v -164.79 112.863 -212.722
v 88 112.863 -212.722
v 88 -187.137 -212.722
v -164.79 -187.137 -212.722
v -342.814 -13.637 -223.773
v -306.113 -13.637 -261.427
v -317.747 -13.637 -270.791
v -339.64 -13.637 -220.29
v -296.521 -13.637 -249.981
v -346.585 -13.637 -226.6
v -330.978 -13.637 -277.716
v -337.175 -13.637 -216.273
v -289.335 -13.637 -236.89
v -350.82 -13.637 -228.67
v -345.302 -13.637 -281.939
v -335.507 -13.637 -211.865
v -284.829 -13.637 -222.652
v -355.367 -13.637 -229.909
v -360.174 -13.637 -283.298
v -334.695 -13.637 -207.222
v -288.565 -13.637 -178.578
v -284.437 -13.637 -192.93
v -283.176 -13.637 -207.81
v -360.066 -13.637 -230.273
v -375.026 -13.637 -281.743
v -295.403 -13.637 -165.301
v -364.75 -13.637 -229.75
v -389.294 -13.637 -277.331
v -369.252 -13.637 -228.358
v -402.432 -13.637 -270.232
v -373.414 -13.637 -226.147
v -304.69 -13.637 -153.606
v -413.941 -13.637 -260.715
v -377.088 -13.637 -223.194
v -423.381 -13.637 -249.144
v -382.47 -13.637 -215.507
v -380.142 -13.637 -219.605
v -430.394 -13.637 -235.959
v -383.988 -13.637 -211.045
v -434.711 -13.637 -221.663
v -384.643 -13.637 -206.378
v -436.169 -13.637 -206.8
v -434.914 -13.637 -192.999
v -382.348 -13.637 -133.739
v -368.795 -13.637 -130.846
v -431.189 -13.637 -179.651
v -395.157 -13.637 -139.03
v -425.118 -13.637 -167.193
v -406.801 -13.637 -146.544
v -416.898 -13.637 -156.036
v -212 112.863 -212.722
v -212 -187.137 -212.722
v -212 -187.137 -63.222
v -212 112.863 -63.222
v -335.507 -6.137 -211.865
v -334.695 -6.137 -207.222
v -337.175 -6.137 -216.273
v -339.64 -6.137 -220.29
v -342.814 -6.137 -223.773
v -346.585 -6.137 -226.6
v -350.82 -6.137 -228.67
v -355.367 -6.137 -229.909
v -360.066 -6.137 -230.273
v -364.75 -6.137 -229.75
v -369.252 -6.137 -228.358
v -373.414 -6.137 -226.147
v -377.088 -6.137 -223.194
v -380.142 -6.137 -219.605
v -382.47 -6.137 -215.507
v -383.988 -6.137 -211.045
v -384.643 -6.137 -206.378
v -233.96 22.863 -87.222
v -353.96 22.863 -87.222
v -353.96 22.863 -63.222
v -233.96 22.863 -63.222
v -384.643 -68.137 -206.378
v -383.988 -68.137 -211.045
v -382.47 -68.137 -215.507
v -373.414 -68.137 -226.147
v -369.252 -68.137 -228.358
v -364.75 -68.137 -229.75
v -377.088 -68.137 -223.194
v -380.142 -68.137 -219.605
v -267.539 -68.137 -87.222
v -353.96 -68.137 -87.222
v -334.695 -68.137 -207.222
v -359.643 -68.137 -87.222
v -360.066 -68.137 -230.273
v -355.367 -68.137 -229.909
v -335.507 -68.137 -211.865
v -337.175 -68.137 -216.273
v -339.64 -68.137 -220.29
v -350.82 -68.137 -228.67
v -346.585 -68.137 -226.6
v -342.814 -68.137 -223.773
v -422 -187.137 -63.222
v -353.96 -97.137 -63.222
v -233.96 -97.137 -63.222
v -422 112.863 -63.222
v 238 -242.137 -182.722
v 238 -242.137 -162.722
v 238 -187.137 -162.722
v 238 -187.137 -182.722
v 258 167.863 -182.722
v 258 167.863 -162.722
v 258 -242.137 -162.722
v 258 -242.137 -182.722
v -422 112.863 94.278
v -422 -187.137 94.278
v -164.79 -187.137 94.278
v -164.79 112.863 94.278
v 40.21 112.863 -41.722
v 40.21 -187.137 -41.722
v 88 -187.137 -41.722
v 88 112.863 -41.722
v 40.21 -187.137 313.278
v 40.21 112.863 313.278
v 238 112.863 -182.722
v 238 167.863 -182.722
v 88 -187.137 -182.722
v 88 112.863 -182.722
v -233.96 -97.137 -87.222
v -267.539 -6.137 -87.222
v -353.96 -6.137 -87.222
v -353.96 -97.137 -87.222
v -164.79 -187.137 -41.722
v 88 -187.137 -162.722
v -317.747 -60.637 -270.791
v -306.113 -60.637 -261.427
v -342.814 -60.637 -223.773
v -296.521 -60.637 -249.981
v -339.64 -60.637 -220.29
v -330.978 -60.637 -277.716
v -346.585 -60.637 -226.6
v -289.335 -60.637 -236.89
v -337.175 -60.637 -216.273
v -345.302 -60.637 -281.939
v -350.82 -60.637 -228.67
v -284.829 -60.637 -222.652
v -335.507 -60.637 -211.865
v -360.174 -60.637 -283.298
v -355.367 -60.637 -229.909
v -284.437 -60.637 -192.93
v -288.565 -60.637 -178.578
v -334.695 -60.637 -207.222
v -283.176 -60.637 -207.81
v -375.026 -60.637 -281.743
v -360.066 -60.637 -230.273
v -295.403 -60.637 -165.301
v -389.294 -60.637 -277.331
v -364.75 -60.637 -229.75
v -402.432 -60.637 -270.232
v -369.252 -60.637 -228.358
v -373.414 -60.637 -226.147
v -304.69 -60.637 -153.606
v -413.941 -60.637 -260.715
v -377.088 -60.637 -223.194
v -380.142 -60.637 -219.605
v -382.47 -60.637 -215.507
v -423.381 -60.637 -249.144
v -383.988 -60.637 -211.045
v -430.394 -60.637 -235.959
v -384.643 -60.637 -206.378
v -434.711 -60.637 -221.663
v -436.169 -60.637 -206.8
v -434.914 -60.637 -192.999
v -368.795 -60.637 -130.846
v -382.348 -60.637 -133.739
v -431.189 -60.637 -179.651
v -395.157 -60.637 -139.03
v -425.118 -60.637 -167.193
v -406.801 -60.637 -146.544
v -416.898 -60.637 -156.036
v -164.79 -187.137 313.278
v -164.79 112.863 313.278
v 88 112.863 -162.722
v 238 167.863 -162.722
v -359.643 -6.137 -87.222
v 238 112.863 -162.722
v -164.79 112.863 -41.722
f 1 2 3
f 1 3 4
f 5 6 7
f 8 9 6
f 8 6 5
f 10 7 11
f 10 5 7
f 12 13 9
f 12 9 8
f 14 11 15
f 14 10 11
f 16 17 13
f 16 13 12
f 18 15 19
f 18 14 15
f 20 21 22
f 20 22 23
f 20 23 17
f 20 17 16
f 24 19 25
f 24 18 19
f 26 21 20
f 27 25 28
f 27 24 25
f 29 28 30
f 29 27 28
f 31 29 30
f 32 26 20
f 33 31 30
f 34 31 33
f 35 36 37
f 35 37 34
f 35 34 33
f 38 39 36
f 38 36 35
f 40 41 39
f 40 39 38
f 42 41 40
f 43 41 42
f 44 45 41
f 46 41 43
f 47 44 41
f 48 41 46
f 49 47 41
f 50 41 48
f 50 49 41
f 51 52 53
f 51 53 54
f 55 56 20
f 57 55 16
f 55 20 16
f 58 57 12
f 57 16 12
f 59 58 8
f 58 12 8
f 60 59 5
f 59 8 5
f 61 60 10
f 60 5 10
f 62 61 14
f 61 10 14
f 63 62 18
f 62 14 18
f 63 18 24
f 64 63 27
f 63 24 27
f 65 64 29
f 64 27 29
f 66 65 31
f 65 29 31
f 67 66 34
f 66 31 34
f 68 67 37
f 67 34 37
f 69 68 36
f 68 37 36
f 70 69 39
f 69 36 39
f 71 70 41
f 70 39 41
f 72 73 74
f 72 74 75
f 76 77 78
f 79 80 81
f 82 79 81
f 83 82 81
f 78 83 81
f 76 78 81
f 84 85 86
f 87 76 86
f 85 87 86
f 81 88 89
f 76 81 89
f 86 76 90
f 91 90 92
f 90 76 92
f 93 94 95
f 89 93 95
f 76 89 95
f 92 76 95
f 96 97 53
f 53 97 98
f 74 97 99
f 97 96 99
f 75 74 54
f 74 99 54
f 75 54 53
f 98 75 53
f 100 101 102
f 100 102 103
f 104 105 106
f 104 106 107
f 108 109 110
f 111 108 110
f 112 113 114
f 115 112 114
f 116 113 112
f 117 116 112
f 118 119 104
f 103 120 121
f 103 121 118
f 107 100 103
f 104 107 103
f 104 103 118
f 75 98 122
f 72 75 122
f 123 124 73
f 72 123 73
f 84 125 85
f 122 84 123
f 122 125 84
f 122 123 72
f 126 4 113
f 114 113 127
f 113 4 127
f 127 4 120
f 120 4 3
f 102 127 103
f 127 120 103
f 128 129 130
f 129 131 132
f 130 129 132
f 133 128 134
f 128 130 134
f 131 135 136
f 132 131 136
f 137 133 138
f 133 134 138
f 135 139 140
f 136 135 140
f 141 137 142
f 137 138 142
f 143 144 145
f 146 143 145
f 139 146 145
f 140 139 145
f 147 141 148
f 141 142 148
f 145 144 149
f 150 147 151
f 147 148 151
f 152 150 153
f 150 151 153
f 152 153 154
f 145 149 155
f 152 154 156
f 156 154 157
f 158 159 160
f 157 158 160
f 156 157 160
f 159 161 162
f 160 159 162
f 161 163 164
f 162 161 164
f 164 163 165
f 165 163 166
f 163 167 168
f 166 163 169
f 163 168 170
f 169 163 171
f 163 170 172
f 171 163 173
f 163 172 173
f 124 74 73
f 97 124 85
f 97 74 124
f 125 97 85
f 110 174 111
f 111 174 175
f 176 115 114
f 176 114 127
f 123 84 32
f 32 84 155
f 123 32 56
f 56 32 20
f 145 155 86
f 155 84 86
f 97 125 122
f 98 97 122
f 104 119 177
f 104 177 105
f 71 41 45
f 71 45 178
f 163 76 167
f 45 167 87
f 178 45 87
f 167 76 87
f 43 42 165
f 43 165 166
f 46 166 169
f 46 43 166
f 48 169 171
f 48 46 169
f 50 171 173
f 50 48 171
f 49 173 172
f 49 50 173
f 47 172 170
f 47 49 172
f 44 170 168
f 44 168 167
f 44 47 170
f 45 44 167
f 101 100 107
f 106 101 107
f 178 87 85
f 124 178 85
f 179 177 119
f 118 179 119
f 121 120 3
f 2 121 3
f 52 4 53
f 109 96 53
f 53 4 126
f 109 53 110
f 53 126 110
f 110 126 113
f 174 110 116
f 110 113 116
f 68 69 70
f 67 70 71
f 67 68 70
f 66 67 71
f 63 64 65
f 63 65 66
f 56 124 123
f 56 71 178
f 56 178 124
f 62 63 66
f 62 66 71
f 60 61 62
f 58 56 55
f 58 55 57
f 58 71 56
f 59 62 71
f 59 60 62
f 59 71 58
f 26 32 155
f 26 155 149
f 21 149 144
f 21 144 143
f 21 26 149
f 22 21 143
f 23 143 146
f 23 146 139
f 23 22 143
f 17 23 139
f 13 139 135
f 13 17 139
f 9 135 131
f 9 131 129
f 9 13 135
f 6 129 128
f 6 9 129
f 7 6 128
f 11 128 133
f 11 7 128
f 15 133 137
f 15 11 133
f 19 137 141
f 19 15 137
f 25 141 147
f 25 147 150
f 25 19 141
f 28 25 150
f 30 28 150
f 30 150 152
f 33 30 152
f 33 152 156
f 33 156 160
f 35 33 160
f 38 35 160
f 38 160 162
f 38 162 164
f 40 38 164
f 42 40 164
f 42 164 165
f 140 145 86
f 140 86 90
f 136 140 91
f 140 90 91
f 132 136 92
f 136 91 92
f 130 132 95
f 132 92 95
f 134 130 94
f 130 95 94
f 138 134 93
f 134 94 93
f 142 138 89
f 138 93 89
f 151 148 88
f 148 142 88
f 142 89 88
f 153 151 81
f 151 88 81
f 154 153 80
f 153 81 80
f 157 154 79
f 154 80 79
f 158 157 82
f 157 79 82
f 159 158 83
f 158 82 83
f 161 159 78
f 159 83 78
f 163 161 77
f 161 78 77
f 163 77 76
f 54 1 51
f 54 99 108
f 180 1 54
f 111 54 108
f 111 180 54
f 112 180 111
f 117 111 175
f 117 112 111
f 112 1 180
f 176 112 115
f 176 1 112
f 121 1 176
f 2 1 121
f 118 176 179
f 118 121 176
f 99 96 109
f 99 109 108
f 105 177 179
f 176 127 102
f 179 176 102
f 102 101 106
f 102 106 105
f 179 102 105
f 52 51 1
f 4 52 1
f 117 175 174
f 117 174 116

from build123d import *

# Parameters (mm, degrees)
SKETCH_1_W                     = 300
SKETCH_1_H                     = 171
EXTRUDE_1_DEPTH                = 300
SKETCH_2_W                     = 205.00000064
SKETCH_2_H                     = 300
EXTRUDE_2_DEPTH                = 355
SKETCH_3_W                     = 300
SKETCH_3_H                     = 136
EXTRUDE_3_DEPTH                = 257.21007636
EXTRUDE_4_DEPTH                = 24
EXTRUDE_5_DEPTH                = 120
EXTRUDE_7_DEPTH                = 62
CUT_EXTRUDE_3_DEPTH            = 133
EXTRUDE_9_DEPTH                = 62
CUT_EXTRUDE_4_DEPTH            = 7.5
CUT_EXTRUDE_START              = -7.5
CUT_EXTRUDE_5_DEPTH            = 7.5
SKETCH_13_W                    = 300
SKETCH_13_H                    = 20
EXTRUDE_10_DEPTH               = 170
SKETCH_14_W                    = 20
SKETCH_14_H                    = 20
EXTRUDE_11_DEPTH               = 55
SKETCH_15_W                    = 20
SKETCH_15_H                    = 20
EXTRUDE_13_DEPTH               = 55
MOVE_BODY_2_ANGLE              = 90
SPLIT_START                    = -187.136600778
SPLIT_BODIES_1_DEPTH           = 300
SPLIT_START_2                  = -242.136600778
SPLIT_BODIES_1_2_OUTLINE_W     = 20
SPLIT_BODIES_1_2_OUTLINE_H     = 20
SPLIT_BODIES_1_2_DEPTH         = 410
SPLIT_START_3                  = -212.722279175
SPLIT_BODIES_1_3_DEPTH         = 171
SPLIT_START_4                  = -68.136600778
SPLIT_BODIES_1_4_DEPTH         = 62
SPLIT_START_5                  = -97.136600778
SPLIT_BODIES_1_5_OUTLINE_W     = 120
SPLIT_BODIES_1_5_OUTLINE_H     = 24
SPLIT_BODIES_1_5_DEPTH         = 120
SKETCH_16_W                    = 210
SKETCH_16_H                    = 300
EXTRUDE_14_DEPTH               = 21.5
SPLIT_START_6                  = -63.222279175
SPLIT_BODIES_4_OUTLINE_W       = 257.21007636
SPLIT_BODIES_4_OUTLINE_H       = 300
SPLIT_BODIES_4_DEPTH           = 157.5
SPLIT_BODIES_4_2_OUTLINE_W     = 47.21007636
SPLIT_BODIES_4_2_OUTLINE_H     = 300
SPLIT_BODIES_4_2_DEPTH         = 149.5
SPLIT_BODIES_4_3_OUTLINE_W     = 257.21007636
SPLIT_BODIES_4_3_OUTLINE_H     = 300
SPLIT_BODIES_4_3_DEPTH         = 157.5
SPLIT_BODIES_4_4_OUTLINE_W     = 47.21007636
SPLIT_BODIES_4_4_OUTLINE_H     = 300
SPLIT_BODIES_4_4_DEPTH         = 149.5
SPLIT_BODIES_7_SURFACE_1_BACK  = 1003.933
SPLIT_BODIES_7_SURFACE_1_DEPTH = 2007.866
SPLIT_BODIES_7_SURFACE_2_BACK  = 1003.933
SPLIT_BODIES_7_SURFACE_2_DEPTH = 2007.866


# Read off the part's stored shape, not the designer's step: 部品分割1, 部品分割3, 部品分割4
with BuildPart() as part:
    # ｽｹｯﾁ1 → ﾎﾞｽ - 押し出し1 (new body)
    with BuildSketch(Plane(origin=(0, 0, 0), x_dir=(0, 0, -1), z_dir=(1, 0, 0))):
        with Locations((105.647745135, 53.288865182)):
            Rectangle(SKETCH_1_W, SKETCH_1_H)
    extrude(amount=EXTRUDE_1_DEPTH)

    # ｽｹｯﾁ2 → ﾎﾞｽ - 押し出し2 (add)
    with BuildSketch(Plane(origin=(0, 138.788865182, 0), x_dir=(1, 0, 0), z_dir=(0, 1, 0))):
        with Locations((149.71007668, 105.647745135)):
            Rectangle(SKETCH_2_W, SKETCH_2_H)
    extrude(amount=EXTRUDE_2_DEPTH)

    # ｽｹｯﾁ3 → ﾎﾞｽ - 押し出し3 (add)
    with BuildSketch(Plane.ZY.offset(-47.21007636)):
        with Locations((-105.647745135, 206.788865182)):
            Rectangle(SKETCH_3_W, SKETCH_3_H)
    extrude(amount=EXTRUDE_3_DEPTH)

    # ｽｹｯﾁ4 → ﾎﾞｽ - 押し出し4 (add)
    with BuildSketch(Plane.XZ.offset(-138.788865182)):
        Polygon((-141.96039145, -105.647745135), (-141.96039145, -45.647745135), (-21.96039145, -45.647745135), (-21.96039145, -165.647745135), (-141.96039145, -165.647745135), align=None)
    extrude(amount=EXTRUDE_4_DEPTH)

    # ｽｹｯﾁ5 → ﾎﾞｽ - 押し出し5 (add)
    with BuildSketch(Plane.XZ.offset(-114.788865182)):
        Polygon((-141.96039145, -105.647745135), (-141.96039145, -136.647745135), (-21.96039145, -136.647745135), (-21.96039145, -74.647745135), (-141.96039145, -74.647745135), align=None)
    extrude(amount=EXTRUDE_5_DEPTH)

    # ｽｹｯﾁ6 → ﾎﾞｽ - 押し出し7 (add)
    with BuildSketch(Plane(origin=(0, 0, -136.647745135), x_dir=(-1, 0, 0), z_dir=(0, 0, -1))):
        Polygon((141.96039145, 114.788865182), (81.96039145, 114.788865182), (122.64268945, -4.366639057), (147.64268945, -4.366639057), (147.64268945, 114.788865182), align=None)
        with BuildLine():
            Line((147.64268945, -4.366639057), (122.64268945, -4.366639057))
            ThreePointArc((122.64268945, -4.366639057), (147.64268945, -28.265469922), (172.64268945, -4.366639057))
            Line((172.64268945, -4.366639057), (147.64268945, -4.366639057))
        make_face()
        Polygon((172.64268945, -4.366639057), (147.64268945, 114.788865182), (147.64268945, -4.366639057), align=None)
    extrude(amount=-EXTRUDE_7_DEPTH)

    # ｽｹｯﾁ8 → ｶｯﾄ - 押し出し3 (cut)
    with BuildSketch(Plane(origin=(0, 0, -136.647745135), x_dir=(-1, 0, 0), z_dir=(0, 0, -1))):
        Polygon((122.695062033, -5.211134818), (55.539135991, 114.788865182), (21.96039145, 114.788865182), (21.96039145, -5.211134818), align=None)
    extrude(amount=-CUT_EXTRUDE_3_DEPTH, mode=Mode.SUBTRACT)

    # ｽｹｯﾁ13 → ﾎﾞｽ - 押し出し10 (add)
    with BuildSketch(Plane(origin=(300, 0, 0), x_dir=(0, 0, -1), z_dir=(1, 0, 0))):
        with Locations((105.647745135, 7.788865182)):
            Rectangle(SKETCH_13_W, SKETCH_13_H)
    extrude(amount=EXTRUDE_10_DEPTH)

    # ｽｹｯﾁ14 → ﾎﾞｽ - 押し出し11 (add)
    with BuildSketch(Plane.XY.offset(44.352254865)):
        with Locations((460, 7.788865182)):
            Rectangle(SKETCH_14_W, SKETCH_14_H)
    extrude(amount=EXTRUDE_11_DEPTH)

    # ｽｹｯﾁ15 → ﾎﾞｽ - 押し出し13 (add)
    with BuildSketch(Plane(origin=(0, 0, -255.647745135), x_dir=(-1, 0, 0), z_dir=(0, 0, -1))):
        with Locations((-460, 7.788865182)):
            Rectangle(SKETCH_15_W, SKETCH_15_H)
    extrude(amount=EXTRUDE_13_DEPTH)


with BuildPart() as body_2:
    # ｽｹｯﾁ9 → ﾎﾞｽ - 押し出し9 (new body)
    with BuildSketch(Plane(origin=(0, 0, -136.647745135), x_dir=(-1, 0, 0), z_dir=(0, 0, -1))):
        with BuildLine():
            ThreePointArc((172.64268945, -4.366639057), (148.065748541, -28.261893715), (122.695062033, -5.211134818))
            Line((122.695062033, -5.211134818), (92.689876472, 48.40471831))
            ThreePointArc((92.689876472, 48.40471831), (118.977792145, -75.704835229), (224.168875741, -4.788886938))
            ThreePointArc((224.168875741, -4.788886938), (204.898385478, 45.975600801), (156.795458346, 71.164753462))
            Line((156.795458346, 71.164753462), (172.64268945, -4.366639057))
        make_face()
    extrude(amount=-EXTRUDE_9_DEPTH)

    # ｽｹｯﾁ11 → ｶｯﾄ - 押し出し4 (cut)
    with BuildSketch(Plane(origin=(0, 0, -136.647745135), x_dir=(-1, 0, 0), z_dir=(0, 0, -1))):
        with BuildLine():
            Line((156.795458346, 71.164753462), (172.64268945, -4.366639057))
            ThreePointArc((172.64268945, -4.366639057), (148.065748541, -28.261893715), (122.695062033, -5.211134818))
            Line((122.695062033, -5.211134818), (92.689876472, 48.40471831))
            ThreePointArc((92.689876472, 48.40471831), (173.264106323, -76.880038763), (156.795458346, 71.164753462))
        make_face()
    extrude(amount=-CUT_EXTRUDE_4_DEPTH, mode=Mode.SUBTRACT)

    # ｽｹｯﾁ12 → ｶｯﾄ - 押し出し5 (cut)
    with BuildSketch(Plane.XY.offset(-74.647745135).offset(CUT_EXTRUDE_START)):
        with BuildLine():
            Line((-156.795458346, 71.164753462), (-172.64268945, -4.366639057))
            ThreePointArc((-172.64268945, -4.366639057), (-148.065748541, -28.261893715), (-122.695062033, -5.211134818))
            Line((-122.695062033, -5.211134818), (-92.689876472, 48.40471831))
            ThreePointArc((-92.689876472, 48.40471831), (-173.264106323, -76.880038763), (-156.795458346, 71.164753462))
        make_face()
    extrude(amount=CUT_EXTRUDE_5_DEPTH, mode=Mode.SUBTRACT)


with BuildPart() as part_1:
    # Move Body 2: moved
    add(part.part.rotate(Axis((0, 112.863399222, -105.647745135), (1, 0, 0)), MOVE_BODY_2_ANGLE))


with BuildPart() as body_2_1:
    # Move Body 2: moved
    add(body_2.part.rotate(Axis((0, 112.863399222, -105.647745135), (1, 0, 0)), MOVE_BODY_2_ANGLE))


with BuildPart() as part_2:
    # Move Body 3: moved
    add(part_1.part.moved(Location((-212, -150, 38))))

    # Split Bodies 1 3 outline → Split Bodies 1 3 (cut)
    with BuildSketch(Plane.XY.offset(SPLIT_START_3)):
        Polygon((-212, 112.863399222), (-212, -187.136600778), (238, -187.136600778), (238, -242.136600778), (258, -242.136600778), (258, 167.863399222), (238, 167.863399222), (238, 112.863399222), align=None)
        Polygon((-386, -6.136600778), (-386, -68.136600778), (-353.96039145, -68.136600778), (-353.96039145, -97.136600778), (-233.96039145, -97.136600778), (-233.96039145, 22.863399222), (-353.96039145, 22.863399222), (-353.96039145, -6.136600778), align=None)
    extrude(amount=SPLIT_BODIES_1_3_DEPTH, mode=Mode.SUBTRACT)


with BuildPart() as body_2_2:
    # Move Body 3: moved
    add(body_2_1.part.moved(Location((-212, -150, 38))))


with BuildPart() as body_3:
    # Split Bodies 1 outline → Split Bodies 1 (new body)
    with BuildSketch(Plane(origin=(0, 0, 0), x_dir=(1, 0, 0), z_dir=(0, 1.0, 1.1906985813992e-12)).offset(SPLIT_START)):
        Polygon((-212, 41.722279175), (88, 41.722279175), (88, 162.722279175), (258, 162.722279175), (258, 182.722279175), (88, 182.722279175), (88, 212.722279175), (-212, 212.722279175), align=None)
    extrude(amount=SPLIT_BODIES_1_DEPTH)

    # Split Bodies 1 2 outline → Split Bodies 1 2 (add)
    with BuildSketch(Plane(origin=(0, 0, 0), x_dir=(1, 0, 0), z_dir=(0, 1.0, 1.1906985813992e-12)).offset(SPLIT_START_2)):
        with Locations((248, 172.722279175)):
            Rectangle(SPLIT_BODIES_1_2_OUTLINE_W, SPLIT_BODIES_1_2_OUTLINE_H)
    extrude(amount=SPLIT_BODIES_1_2_DEPTH)


with BuildPart() as body_4:
    # Split Bodies 1 4 outline → Split Bodies 1 4 (new body)
    with BuildSketch(Plane(origin=(0, 0, 0), x_dir=(1, 0, 0), z_dir=(0, 1.0, 1.1906985813992e-12)).offset(SPLIT_START_4)):
        with BuildLine():
            Line((-233.96039145, 41.722279175), (-233.96039145, 65.722279175))
            Line((-233.96039145, 65.722279175), (-267.539135991, 65.722279175))
            Line((-267.539135991, 65.722279175), (-334.695062033, 185.722279175))
            ThreePointArc((-334.695062033, 185.722279175), (-360.065748541, 208.773038071), (-384.64268945, 184.877783414))
            Line((-384.64268945, 184.877783414), (-359.64268945, 65.722279175))
            Line((-359.64268945, 65.722279175), (-353.96039145, 65.722279175))
            Line((-353.96039145, 65.722279175), (-353.96039145, 41.722279175))
            Line((-353.96039145, 41.722279175), (-233.96039145, 41.722279175))
        make_face()
    extrude(amount=SPLIT_BODIES_1_4_DEPTH)

    # Split Bodies 1 5 outline → Split Bodies 1 5 (add)
    with BuildSketch(Plane(origin=(0, 0, 0), x_dir=(1, 0, 0), z_dir=(0, 1.0, 1.1906985813992e-12)).offset(SPLIT_START_5)):
        with Locations((-293.96039145, 53.722279175)):
            Rectangle(SPLIT_BODIES_1_5_OUTLINE_W, SPLIT_BODIES_1_5_OUTLINE_H)
    extrude(amount=SPLIT_BODIES_1_5_DEPTH)


with BuildPart() as body_4_1:
    # Move Body 4: moved
    add(body_4.part.moved(Location((0, 0, -21.5))))


with BuildPart() as body_2_3:
    # Move Body 4: moved
    add(body_2_2.part.moved(Location((0, 0, -21.5))))


with BuildPart() as body_5:
    # ｽｹｯﾁ16 → ﾎﾞｽ - 押し出し14 (new body)
    with BuildSketch(Plane(origin=(0, 0, -41.722279175), x_dir=(-1, 0, 0), z_dir=(0, 1.1906985813991966e-12, -1.0))):
        with Locations((317, -37.136600778)):
            Rectangle(SKETCH_16_W, SKETCH_16_H)
    extrude(amount=EXTRUDE_14_DEPTH)


with BuildPart() as part_3:
    add(part_2.part)

    # Combine 1: union body 5, body 3, body 4, body 2
    add(body_5.part)
    add(body_3.part)
    add(body_4_1.part)
    add(body_2_3.part)


with BuildPart() as body_2_2_1:
    # Split Bodies 3: the piece on the far side of the plane
    add(part_3.part)
    split(bisect_by=Plane.YZ.offset(-164.78992364), keep=Keep.BOTTOM)

    # Split Bodies 4 outline → Split Bodies 4 (cut)
    with BuildSketch(Plane.XY.offset(SPLIT_START_6)):
        with Locations((-293.39496182, -37.136600778)):
            Rectangle(SPLIT_BODIES_4_OUTLINE_W, SPLIT_BODIES_4_OUTLINE_H)
    extrude(amount=SPLIT_BODIES_4_DEPTH, mode=Mode.SUBTRACT)

    # Split Bodies 4 2 outline → Split Bodies 4 2 (cut)
    with BuildSketch(Plane.XY.offset(SPLIT_START_3)):
        with Locations((-188.39496182, -37.136600778)):
            Rectangle(SPLIT_BODIES_4_2_OUTLINE_W, SPLIT_BODIES_4_2_OUTLINE_H)
    extrude(amount=SPLIT_BODIES_4_2_DEPTH, mode=Mode.SUBTRACT)


with BuildPart() as part_4:
    add(part_3.part)

    # Split Bodies 3
    split(bisect_by=Plane.YZ.offset(-164.78992364), keep=Keep.TOP)


with BuildPart() as body_3_2:
    # Split Bodies 4 3 outline → Split Bodies 4 3 (new body)
    with BuildSketch(Plane.XY.offset(SPLIT_START_6)):
        with Locations((-293.39496182, -37.136600778)):
            Rectangle(SPLIT_BODIES_4_3_OUTLINE_W, SPLIT_BODIES_4_3_OUTLINE_H)
    extrude(amount=SPLIT_BODIES_4_3_DEPTH)

    # Split Bodies 4 4 outline → Split Bodies 4 4 (add)
    with BuildSketch(Plane.XY.offset(SPLIT_START_3)):
        with Locations((-188.39496182, -37.136600778)):
            Rectangle(SPLIT_BODIES_4_4_OUTLINE_W, SPLIT_BODIES_4_4_OUTLINE_H)
    extrude(amount=SPLIT_BODIES_4_4_DEPTH)


with BuildPart() as body_4_2:
    # Split Bodies 7: the piece behind the surface
    add(part_4.part)
    # Split Bodies 7 surface: a surface, the sketch's curves swept straight by 2007.866 mm
    with BuildLine(Plane.XY.offset(313.277720825).offset(-SPLIT_BODIES_7_SURFACE_1_BACK), mode=Mode.PRIVATE) as split_bodies_7_surface_1_path:
        Line((-60.73235277, -188.487666989), (-60.73235277, 112.863399222))
    split_bodies_7_surface_1 = Shell.extrude(split_bodies_7_surface_1_path.wire(), (0 * SPLIT_BODIES_7_SURFACE_1_DEPTH, 0 * SPLIT_BODIES_7_SURFACE_1_DEPTH, 1 * SPLIT_BODIES_7_SURFACE_1_DEPTH))
    split(bisect_by=split_bodies_7_surface_1, keep=Keep.BOTTOM)


with BuildPart() as part_5:
    add(part_4.part)

    # Split Bodies 7: split by a surface, the side it looks to stays
    # Split Bodies 7 surface: a surface, the sketch's curves swept straight by 2007.866 mm
    with BuildLine(Plane.XY.offset(313.277720825).offset(-SPLIT_BODIES_7_SURFACE_2_BACK), mode=Mode.PRIVATE) as split_bodies_7_surface_2_path:
        Line((-60.73235277, -188.487666989), (-60.73235277, 112.863399222))
    split_bodies_7_surface_2 = Shell.extrude(split_bodies_7_surface_2_path.wire(), (0 * SPLIT_BODIES_7_SURFACE_2_DEPTH, 0 * SPLIT_BODIES_7_SURFACE_2_DEPTH, 1 * SPLIT_BODIES_7_SURFACE_2_DEPTH))
    split(bisect_by=split_bodies_7_surface_2, keep=Keep.TOP)


with BuildPart() as body_3_2_1:
    add(body_3_2.part)

    # Combine 2: union body 2 2, part, body 4 2
    add(body_2_2_1.part)
    add(part_5.part)
    add(body_4_2.part)


solid = body_3_2_1.part
